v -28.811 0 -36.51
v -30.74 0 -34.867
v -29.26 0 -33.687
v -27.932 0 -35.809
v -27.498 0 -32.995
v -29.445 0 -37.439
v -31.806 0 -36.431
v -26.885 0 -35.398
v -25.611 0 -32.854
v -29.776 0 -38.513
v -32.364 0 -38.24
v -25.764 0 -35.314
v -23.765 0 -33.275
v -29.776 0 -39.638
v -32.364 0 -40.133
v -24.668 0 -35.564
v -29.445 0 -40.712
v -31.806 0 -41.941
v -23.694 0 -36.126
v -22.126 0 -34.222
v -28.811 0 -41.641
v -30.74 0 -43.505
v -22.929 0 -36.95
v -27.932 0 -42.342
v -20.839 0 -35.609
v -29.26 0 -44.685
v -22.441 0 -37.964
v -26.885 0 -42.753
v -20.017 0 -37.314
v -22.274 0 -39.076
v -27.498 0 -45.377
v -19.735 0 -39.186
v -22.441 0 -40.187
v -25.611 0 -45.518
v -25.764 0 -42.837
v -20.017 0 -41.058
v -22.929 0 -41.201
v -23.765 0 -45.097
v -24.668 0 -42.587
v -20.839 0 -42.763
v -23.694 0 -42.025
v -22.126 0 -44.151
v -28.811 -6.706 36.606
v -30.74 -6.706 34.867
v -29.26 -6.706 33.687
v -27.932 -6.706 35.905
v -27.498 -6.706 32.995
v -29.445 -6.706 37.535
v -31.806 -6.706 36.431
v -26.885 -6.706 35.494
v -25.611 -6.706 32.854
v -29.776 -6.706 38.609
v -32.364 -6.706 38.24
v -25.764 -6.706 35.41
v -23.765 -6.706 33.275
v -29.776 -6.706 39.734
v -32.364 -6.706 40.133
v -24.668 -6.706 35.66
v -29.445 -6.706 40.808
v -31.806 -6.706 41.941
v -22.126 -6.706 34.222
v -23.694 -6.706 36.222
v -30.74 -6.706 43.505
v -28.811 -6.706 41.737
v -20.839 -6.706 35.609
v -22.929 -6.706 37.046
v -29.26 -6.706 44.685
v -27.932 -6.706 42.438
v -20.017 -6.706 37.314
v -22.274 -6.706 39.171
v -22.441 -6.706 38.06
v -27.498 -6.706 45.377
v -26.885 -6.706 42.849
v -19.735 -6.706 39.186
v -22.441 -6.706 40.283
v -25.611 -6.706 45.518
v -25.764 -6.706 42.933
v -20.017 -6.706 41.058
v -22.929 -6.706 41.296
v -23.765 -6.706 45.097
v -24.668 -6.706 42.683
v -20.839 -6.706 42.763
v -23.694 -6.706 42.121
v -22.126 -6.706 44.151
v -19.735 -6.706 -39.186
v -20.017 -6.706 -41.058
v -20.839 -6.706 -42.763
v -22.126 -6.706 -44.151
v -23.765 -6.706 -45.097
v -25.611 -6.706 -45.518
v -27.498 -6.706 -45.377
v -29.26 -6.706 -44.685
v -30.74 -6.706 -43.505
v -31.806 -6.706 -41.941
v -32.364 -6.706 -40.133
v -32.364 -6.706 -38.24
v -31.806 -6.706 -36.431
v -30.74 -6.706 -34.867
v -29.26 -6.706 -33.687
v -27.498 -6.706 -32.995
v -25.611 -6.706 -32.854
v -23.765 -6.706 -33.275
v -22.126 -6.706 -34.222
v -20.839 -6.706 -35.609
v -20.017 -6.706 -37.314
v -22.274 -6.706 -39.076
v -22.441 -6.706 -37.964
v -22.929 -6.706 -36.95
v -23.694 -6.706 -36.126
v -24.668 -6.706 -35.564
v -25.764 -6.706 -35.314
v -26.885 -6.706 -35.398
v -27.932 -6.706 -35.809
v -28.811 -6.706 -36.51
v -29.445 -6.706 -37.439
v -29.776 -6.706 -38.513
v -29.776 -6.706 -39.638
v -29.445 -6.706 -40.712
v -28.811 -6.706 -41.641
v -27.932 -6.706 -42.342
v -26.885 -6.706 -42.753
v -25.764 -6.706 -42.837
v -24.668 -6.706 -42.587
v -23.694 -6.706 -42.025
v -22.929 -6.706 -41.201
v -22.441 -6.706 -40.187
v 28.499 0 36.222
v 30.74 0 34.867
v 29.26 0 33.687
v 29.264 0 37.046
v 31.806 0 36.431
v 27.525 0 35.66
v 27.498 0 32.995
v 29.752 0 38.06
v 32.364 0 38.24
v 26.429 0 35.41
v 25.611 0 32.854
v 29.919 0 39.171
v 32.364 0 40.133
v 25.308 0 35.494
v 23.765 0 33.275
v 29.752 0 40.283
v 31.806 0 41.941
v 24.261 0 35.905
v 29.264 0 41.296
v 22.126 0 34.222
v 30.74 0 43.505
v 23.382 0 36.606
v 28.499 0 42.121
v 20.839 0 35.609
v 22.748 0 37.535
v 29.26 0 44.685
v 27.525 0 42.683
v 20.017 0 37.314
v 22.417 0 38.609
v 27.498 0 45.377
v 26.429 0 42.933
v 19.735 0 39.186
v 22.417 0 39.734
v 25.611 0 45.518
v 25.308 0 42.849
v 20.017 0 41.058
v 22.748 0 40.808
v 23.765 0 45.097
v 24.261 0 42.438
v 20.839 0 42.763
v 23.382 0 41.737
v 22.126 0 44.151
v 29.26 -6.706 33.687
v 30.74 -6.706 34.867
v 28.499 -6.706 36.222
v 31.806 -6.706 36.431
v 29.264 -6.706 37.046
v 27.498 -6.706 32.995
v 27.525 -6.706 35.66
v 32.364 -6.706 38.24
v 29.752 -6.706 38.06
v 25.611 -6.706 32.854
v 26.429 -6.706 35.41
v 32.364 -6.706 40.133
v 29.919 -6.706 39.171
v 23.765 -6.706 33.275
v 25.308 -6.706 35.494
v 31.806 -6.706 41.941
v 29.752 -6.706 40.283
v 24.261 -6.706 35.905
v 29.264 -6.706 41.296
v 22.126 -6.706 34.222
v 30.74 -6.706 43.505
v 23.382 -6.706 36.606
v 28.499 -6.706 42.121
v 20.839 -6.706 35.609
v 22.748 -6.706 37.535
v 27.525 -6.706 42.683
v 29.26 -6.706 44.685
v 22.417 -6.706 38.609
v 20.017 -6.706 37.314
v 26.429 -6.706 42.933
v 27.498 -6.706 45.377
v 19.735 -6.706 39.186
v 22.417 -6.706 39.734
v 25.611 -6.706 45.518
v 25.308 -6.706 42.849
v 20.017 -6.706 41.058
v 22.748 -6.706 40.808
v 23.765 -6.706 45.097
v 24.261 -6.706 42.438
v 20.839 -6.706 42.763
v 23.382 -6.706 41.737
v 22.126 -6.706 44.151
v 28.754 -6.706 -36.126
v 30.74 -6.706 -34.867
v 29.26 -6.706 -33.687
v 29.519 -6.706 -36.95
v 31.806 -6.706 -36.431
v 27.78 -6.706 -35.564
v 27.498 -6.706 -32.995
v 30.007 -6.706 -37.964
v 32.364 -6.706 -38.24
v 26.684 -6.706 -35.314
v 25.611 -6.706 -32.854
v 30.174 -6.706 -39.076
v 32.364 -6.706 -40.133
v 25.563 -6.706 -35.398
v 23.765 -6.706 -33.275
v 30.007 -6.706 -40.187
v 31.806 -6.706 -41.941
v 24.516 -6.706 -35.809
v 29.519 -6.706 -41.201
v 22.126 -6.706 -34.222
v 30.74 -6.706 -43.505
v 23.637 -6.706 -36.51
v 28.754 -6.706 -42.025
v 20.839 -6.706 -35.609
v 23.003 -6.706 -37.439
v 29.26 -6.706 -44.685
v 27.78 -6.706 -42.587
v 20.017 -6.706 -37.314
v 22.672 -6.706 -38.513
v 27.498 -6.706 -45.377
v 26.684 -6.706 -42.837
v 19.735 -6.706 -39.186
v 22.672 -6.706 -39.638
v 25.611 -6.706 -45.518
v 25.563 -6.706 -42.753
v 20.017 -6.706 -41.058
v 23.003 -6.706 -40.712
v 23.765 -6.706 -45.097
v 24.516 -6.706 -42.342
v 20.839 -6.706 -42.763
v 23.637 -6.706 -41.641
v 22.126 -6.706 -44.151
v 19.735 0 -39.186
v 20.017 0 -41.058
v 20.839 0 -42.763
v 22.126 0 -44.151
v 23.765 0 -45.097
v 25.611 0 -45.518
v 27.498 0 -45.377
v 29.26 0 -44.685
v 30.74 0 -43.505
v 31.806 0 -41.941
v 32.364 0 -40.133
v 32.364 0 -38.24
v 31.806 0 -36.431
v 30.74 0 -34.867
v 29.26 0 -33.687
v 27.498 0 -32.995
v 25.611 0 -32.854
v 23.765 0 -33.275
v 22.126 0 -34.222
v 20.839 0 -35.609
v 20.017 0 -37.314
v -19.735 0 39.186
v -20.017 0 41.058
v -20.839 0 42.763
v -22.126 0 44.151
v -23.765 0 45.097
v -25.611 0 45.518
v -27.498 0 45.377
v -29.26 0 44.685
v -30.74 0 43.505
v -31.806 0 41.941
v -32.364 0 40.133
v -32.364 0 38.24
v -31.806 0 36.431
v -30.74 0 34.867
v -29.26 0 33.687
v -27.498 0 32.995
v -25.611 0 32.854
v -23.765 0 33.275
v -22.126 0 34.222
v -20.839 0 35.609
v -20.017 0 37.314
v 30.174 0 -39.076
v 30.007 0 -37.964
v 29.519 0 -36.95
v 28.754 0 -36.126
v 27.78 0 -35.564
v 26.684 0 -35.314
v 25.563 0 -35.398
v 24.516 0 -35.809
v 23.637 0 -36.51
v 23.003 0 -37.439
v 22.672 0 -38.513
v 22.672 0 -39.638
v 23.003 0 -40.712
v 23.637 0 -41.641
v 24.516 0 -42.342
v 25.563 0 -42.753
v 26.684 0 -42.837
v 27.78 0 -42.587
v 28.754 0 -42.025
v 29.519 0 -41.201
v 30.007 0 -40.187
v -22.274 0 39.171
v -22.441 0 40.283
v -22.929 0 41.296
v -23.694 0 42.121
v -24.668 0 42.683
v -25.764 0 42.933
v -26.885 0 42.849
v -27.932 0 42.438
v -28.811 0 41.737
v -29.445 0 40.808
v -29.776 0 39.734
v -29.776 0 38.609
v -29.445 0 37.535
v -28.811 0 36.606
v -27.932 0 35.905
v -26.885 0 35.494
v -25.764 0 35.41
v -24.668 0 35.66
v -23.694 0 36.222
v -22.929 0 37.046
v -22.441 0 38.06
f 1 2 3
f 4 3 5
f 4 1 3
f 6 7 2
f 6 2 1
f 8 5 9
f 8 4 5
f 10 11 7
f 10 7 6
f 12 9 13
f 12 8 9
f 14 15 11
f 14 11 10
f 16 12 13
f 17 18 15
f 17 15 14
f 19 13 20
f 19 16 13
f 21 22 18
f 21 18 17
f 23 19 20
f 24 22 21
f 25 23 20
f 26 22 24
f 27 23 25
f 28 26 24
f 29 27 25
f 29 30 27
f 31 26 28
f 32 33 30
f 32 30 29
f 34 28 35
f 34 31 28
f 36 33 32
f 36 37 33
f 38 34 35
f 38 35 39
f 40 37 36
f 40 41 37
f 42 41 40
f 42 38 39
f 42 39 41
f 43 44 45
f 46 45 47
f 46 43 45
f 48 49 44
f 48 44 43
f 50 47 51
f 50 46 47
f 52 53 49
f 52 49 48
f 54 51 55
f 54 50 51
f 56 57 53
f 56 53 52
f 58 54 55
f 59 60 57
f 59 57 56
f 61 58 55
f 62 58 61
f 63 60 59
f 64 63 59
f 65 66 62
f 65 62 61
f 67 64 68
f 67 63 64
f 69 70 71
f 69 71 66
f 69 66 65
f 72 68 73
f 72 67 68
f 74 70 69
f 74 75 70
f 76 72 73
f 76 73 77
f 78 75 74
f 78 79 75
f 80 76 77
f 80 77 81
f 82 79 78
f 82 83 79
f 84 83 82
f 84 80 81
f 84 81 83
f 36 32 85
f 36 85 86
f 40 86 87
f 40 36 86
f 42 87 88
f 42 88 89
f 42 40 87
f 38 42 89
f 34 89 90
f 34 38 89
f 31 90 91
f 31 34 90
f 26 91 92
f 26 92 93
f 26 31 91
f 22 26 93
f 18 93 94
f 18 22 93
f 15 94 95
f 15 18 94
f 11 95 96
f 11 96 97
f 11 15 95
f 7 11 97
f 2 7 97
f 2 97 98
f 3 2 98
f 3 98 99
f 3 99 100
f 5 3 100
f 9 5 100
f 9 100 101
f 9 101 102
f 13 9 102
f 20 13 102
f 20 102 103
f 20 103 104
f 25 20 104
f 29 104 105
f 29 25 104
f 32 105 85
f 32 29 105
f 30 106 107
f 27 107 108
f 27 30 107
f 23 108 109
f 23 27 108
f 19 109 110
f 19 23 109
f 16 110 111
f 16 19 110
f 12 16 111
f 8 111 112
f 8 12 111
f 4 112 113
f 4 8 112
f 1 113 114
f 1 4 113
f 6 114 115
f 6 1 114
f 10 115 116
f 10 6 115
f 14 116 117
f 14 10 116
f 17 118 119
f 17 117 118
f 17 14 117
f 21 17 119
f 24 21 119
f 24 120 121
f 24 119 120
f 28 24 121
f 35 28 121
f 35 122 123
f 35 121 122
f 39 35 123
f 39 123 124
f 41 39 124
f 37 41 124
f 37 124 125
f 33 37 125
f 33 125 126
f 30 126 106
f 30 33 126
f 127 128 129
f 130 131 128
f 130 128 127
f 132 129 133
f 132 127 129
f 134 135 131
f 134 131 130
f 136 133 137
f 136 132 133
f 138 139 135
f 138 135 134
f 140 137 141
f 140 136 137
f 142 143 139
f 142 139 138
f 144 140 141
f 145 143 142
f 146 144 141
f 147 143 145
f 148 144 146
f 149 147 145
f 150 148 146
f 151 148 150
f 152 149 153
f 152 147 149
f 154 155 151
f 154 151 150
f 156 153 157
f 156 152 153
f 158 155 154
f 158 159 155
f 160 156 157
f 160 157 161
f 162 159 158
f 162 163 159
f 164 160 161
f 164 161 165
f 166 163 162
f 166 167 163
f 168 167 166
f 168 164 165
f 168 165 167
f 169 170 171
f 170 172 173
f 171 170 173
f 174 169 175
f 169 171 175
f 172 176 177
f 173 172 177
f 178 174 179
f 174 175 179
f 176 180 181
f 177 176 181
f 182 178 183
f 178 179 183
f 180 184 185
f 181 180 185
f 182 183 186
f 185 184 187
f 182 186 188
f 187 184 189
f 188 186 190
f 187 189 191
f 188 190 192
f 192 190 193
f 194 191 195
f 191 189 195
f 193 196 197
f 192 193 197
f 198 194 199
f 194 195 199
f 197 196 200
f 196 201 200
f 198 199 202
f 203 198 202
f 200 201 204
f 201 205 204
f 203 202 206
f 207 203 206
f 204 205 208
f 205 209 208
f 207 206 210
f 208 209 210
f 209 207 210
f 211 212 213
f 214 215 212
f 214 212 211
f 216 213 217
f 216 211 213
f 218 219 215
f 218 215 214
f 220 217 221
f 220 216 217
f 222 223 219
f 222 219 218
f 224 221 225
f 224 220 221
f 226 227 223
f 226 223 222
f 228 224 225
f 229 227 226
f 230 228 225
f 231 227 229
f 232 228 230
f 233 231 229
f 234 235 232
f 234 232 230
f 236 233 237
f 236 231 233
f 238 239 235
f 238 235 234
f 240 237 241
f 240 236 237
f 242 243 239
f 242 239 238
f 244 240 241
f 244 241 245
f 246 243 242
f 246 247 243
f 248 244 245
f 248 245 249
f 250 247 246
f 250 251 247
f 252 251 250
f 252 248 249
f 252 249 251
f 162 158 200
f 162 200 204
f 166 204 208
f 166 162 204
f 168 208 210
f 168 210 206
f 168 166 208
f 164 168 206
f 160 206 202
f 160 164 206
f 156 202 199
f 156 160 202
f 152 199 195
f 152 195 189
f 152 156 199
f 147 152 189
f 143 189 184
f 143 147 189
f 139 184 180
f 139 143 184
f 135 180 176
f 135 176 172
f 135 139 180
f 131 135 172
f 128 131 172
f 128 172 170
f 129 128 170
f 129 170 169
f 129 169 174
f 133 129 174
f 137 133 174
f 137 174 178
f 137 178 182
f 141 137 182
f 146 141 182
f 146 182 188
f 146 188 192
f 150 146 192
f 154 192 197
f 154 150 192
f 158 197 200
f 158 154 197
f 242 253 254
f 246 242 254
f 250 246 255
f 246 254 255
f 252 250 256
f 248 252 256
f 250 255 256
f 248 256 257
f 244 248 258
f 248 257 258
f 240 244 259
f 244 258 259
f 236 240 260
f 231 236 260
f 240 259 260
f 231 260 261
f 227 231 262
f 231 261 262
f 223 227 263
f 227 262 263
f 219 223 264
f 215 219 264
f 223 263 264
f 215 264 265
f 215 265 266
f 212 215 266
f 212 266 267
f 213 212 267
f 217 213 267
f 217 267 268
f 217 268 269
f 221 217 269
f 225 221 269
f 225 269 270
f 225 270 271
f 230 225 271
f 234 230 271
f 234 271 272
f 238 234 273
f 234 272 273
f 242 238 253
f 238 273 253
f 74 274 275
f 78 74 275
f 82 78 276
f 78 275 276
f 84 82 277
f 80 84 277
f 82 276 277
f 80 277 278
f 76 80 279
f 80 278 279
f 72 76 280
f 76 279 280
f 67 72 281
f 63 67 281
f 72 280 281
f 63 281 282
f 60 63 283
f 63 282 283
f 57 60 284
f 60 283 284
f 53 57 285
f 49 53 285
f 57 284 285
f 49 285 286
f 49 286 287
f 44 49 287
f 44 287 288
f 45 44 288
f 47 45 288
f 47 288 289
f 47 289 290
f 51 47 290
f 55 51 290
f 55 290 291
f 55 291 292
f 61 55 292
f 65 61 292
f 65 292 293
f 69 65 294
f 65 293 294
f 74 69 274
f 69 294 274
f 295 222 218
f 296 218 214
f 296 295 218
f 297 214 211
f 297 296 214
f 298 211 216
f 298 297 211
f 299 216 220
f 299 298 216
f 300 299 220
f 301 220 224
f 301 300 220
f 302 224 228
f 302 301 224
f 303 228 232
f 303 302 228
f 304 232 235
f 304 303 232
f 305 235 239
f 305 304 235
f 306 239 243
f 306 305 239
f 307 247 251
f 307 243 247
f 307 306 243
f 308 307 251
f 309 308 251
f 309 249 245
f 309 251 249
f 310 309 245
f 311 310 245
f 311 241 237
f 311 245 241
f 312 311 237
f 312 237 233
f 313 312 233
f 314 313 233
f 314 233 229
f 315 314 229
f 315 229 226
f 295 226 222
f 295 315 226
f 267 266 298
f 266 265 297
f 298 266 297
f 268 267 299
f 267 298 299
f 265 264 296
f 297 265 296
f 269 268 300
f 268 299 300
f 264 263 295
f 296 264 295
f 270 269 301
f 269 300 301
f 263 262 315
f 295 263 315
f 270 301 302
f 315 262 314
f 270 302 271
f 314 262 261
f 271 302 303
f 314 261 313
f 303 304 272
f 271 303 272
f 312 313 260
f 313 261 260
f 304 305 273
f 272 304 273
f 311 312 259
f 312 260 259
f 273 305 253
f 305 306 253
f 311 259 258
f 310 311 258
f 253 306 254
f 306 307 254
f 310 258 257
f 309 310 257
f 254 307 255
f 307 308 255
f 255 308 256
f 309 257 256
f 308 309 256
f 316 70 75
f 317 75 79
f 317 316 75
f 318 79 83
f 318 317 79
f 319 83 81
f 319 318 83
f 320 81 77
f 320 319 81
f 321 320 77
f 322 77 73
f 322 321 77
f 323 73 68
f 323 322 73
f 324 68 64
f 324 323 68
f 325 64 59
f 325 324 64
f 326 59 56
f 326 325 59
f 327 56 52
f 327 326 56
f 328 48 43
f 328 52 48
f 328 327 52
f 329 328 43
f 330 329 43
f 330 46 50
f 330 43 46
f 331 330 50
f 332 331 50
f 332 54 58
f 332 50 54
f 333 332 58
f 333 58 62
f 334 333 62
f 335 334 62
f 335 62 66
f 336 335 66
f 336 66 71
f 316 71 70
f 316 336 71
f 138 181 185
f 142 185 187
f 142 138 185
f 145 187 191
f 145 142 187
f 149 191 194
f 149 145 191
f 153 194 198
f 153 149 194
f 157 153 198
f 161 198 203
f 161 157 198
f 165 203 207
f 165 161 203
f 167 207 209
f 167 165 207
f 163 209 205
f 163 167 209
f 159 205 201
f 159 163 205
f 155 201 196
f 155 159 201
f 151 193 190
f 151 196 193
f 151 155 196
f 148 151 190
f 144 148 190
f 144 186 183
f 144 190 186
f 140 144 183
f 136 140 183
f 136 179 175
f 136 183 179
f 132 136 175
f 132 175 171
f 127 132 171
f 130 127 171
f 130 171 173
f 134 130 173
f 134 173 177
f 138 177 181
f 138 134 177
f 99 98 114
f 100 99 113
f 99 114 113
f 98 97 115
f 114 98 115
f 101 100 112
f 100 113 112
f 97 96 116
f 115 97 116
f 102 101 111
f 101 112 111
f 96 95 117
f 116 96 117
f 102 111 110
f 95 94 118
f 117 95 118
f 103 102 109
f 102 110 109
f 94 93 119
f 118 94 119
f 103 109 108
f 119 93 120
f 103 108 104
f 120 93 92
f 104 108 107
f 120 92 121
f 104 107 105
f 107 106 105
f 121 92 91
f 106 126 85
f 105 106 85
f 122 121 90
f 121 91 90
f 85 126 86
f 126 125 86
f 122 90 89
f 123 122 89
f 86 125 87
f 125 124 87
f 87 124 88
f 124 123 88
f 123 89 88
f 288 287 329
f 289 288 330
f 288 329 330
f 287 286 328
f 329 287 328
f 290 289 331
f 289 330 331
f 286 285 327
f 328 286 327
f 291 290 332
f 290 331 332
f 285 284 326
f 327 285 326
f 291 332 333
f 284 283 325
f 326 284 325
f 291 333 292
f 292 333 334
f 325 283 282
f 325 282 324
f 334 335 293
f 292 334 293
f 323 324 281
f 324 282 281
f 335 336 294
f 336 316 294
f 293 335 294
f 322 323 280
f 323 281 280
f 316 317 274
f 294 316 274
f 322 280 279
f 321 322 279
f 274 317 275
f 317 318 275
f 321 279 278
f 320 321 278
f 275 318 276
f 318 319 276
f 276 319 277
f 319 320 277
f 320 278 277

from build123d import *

# Parameters (mm, degrees)
F0_R     = 6.35
F1_DEPTH = 6.7056
F5_R     = 3.772287
F5_R_2   = 3.77229
F5_R_3   = 3.772288
F5_R_4   = 3.772294
F6_DEPTH = 15.24


with BuildPart() as f1:
    # F0 (on Front) → F1 (new body)
    with BuildSketch(Plane.XZ):
        with Locations((-26.085133, 39.186187)):
            Circle(F0_R)
    extrude(amount=F1_DEPTH)


with BuildPart() as f2_1:
    # F2: instance of F1
    add(f1.part.mirror(Plane.YZ))


with BuildPart() as f3_1:
    # F3: instance of F1
    add(f1.part.mirror(Plane.XY))


with BuildPart() as f4_1:
    # F4: instance of F3_1
    add(f3_1.part.mirror(Plane.YZ))


with BuildPart() as f6_tool:
    # F5 (on Front) → F6 (new body)
    with BuildSketch(Plane.XZ):
        with Locations((-26.045823, 39.171409)):
            Circle(F5_R)
        with Locations((26.147064, 39.171409)):
            Circle(F5_R_2)
        with Locations((-26.045823, -39.075501)):
            Circle(F5_R_3)
        with Locations((26.401937, -39.075501)):
            Circle(F5_R_4)
    extrude(amount=F6_DEPTH)


with BuildPart() as f1_1:
    add(f1.part)

    # F6: cut by f6_tool
    add(f6_tool.part, mode=Mode.SUBTRACT)


with BuildPart() as f2_1_1:
    add(f2_1.part)

    # F6: cut by f6_tool
    add(f6_tool.part, mode=Mode.SUBTRACT)


with BuildPart() as f3_1_1:
    add(f3_1.part)

    # F6: cut by f6_tool
    add(f6_tool.part, mode=Mode.SUBTRACT)


with BuildPart() as f4_1_1:
    add(f4_1.part)

    # F6: cut by f6_tool
    add(f6_tool.part, mode=Mode.SUBTRACT)


solid = Compound([f1_1.part, f2_1_1.part, f3_1_1.part, f4_1_1.part])
